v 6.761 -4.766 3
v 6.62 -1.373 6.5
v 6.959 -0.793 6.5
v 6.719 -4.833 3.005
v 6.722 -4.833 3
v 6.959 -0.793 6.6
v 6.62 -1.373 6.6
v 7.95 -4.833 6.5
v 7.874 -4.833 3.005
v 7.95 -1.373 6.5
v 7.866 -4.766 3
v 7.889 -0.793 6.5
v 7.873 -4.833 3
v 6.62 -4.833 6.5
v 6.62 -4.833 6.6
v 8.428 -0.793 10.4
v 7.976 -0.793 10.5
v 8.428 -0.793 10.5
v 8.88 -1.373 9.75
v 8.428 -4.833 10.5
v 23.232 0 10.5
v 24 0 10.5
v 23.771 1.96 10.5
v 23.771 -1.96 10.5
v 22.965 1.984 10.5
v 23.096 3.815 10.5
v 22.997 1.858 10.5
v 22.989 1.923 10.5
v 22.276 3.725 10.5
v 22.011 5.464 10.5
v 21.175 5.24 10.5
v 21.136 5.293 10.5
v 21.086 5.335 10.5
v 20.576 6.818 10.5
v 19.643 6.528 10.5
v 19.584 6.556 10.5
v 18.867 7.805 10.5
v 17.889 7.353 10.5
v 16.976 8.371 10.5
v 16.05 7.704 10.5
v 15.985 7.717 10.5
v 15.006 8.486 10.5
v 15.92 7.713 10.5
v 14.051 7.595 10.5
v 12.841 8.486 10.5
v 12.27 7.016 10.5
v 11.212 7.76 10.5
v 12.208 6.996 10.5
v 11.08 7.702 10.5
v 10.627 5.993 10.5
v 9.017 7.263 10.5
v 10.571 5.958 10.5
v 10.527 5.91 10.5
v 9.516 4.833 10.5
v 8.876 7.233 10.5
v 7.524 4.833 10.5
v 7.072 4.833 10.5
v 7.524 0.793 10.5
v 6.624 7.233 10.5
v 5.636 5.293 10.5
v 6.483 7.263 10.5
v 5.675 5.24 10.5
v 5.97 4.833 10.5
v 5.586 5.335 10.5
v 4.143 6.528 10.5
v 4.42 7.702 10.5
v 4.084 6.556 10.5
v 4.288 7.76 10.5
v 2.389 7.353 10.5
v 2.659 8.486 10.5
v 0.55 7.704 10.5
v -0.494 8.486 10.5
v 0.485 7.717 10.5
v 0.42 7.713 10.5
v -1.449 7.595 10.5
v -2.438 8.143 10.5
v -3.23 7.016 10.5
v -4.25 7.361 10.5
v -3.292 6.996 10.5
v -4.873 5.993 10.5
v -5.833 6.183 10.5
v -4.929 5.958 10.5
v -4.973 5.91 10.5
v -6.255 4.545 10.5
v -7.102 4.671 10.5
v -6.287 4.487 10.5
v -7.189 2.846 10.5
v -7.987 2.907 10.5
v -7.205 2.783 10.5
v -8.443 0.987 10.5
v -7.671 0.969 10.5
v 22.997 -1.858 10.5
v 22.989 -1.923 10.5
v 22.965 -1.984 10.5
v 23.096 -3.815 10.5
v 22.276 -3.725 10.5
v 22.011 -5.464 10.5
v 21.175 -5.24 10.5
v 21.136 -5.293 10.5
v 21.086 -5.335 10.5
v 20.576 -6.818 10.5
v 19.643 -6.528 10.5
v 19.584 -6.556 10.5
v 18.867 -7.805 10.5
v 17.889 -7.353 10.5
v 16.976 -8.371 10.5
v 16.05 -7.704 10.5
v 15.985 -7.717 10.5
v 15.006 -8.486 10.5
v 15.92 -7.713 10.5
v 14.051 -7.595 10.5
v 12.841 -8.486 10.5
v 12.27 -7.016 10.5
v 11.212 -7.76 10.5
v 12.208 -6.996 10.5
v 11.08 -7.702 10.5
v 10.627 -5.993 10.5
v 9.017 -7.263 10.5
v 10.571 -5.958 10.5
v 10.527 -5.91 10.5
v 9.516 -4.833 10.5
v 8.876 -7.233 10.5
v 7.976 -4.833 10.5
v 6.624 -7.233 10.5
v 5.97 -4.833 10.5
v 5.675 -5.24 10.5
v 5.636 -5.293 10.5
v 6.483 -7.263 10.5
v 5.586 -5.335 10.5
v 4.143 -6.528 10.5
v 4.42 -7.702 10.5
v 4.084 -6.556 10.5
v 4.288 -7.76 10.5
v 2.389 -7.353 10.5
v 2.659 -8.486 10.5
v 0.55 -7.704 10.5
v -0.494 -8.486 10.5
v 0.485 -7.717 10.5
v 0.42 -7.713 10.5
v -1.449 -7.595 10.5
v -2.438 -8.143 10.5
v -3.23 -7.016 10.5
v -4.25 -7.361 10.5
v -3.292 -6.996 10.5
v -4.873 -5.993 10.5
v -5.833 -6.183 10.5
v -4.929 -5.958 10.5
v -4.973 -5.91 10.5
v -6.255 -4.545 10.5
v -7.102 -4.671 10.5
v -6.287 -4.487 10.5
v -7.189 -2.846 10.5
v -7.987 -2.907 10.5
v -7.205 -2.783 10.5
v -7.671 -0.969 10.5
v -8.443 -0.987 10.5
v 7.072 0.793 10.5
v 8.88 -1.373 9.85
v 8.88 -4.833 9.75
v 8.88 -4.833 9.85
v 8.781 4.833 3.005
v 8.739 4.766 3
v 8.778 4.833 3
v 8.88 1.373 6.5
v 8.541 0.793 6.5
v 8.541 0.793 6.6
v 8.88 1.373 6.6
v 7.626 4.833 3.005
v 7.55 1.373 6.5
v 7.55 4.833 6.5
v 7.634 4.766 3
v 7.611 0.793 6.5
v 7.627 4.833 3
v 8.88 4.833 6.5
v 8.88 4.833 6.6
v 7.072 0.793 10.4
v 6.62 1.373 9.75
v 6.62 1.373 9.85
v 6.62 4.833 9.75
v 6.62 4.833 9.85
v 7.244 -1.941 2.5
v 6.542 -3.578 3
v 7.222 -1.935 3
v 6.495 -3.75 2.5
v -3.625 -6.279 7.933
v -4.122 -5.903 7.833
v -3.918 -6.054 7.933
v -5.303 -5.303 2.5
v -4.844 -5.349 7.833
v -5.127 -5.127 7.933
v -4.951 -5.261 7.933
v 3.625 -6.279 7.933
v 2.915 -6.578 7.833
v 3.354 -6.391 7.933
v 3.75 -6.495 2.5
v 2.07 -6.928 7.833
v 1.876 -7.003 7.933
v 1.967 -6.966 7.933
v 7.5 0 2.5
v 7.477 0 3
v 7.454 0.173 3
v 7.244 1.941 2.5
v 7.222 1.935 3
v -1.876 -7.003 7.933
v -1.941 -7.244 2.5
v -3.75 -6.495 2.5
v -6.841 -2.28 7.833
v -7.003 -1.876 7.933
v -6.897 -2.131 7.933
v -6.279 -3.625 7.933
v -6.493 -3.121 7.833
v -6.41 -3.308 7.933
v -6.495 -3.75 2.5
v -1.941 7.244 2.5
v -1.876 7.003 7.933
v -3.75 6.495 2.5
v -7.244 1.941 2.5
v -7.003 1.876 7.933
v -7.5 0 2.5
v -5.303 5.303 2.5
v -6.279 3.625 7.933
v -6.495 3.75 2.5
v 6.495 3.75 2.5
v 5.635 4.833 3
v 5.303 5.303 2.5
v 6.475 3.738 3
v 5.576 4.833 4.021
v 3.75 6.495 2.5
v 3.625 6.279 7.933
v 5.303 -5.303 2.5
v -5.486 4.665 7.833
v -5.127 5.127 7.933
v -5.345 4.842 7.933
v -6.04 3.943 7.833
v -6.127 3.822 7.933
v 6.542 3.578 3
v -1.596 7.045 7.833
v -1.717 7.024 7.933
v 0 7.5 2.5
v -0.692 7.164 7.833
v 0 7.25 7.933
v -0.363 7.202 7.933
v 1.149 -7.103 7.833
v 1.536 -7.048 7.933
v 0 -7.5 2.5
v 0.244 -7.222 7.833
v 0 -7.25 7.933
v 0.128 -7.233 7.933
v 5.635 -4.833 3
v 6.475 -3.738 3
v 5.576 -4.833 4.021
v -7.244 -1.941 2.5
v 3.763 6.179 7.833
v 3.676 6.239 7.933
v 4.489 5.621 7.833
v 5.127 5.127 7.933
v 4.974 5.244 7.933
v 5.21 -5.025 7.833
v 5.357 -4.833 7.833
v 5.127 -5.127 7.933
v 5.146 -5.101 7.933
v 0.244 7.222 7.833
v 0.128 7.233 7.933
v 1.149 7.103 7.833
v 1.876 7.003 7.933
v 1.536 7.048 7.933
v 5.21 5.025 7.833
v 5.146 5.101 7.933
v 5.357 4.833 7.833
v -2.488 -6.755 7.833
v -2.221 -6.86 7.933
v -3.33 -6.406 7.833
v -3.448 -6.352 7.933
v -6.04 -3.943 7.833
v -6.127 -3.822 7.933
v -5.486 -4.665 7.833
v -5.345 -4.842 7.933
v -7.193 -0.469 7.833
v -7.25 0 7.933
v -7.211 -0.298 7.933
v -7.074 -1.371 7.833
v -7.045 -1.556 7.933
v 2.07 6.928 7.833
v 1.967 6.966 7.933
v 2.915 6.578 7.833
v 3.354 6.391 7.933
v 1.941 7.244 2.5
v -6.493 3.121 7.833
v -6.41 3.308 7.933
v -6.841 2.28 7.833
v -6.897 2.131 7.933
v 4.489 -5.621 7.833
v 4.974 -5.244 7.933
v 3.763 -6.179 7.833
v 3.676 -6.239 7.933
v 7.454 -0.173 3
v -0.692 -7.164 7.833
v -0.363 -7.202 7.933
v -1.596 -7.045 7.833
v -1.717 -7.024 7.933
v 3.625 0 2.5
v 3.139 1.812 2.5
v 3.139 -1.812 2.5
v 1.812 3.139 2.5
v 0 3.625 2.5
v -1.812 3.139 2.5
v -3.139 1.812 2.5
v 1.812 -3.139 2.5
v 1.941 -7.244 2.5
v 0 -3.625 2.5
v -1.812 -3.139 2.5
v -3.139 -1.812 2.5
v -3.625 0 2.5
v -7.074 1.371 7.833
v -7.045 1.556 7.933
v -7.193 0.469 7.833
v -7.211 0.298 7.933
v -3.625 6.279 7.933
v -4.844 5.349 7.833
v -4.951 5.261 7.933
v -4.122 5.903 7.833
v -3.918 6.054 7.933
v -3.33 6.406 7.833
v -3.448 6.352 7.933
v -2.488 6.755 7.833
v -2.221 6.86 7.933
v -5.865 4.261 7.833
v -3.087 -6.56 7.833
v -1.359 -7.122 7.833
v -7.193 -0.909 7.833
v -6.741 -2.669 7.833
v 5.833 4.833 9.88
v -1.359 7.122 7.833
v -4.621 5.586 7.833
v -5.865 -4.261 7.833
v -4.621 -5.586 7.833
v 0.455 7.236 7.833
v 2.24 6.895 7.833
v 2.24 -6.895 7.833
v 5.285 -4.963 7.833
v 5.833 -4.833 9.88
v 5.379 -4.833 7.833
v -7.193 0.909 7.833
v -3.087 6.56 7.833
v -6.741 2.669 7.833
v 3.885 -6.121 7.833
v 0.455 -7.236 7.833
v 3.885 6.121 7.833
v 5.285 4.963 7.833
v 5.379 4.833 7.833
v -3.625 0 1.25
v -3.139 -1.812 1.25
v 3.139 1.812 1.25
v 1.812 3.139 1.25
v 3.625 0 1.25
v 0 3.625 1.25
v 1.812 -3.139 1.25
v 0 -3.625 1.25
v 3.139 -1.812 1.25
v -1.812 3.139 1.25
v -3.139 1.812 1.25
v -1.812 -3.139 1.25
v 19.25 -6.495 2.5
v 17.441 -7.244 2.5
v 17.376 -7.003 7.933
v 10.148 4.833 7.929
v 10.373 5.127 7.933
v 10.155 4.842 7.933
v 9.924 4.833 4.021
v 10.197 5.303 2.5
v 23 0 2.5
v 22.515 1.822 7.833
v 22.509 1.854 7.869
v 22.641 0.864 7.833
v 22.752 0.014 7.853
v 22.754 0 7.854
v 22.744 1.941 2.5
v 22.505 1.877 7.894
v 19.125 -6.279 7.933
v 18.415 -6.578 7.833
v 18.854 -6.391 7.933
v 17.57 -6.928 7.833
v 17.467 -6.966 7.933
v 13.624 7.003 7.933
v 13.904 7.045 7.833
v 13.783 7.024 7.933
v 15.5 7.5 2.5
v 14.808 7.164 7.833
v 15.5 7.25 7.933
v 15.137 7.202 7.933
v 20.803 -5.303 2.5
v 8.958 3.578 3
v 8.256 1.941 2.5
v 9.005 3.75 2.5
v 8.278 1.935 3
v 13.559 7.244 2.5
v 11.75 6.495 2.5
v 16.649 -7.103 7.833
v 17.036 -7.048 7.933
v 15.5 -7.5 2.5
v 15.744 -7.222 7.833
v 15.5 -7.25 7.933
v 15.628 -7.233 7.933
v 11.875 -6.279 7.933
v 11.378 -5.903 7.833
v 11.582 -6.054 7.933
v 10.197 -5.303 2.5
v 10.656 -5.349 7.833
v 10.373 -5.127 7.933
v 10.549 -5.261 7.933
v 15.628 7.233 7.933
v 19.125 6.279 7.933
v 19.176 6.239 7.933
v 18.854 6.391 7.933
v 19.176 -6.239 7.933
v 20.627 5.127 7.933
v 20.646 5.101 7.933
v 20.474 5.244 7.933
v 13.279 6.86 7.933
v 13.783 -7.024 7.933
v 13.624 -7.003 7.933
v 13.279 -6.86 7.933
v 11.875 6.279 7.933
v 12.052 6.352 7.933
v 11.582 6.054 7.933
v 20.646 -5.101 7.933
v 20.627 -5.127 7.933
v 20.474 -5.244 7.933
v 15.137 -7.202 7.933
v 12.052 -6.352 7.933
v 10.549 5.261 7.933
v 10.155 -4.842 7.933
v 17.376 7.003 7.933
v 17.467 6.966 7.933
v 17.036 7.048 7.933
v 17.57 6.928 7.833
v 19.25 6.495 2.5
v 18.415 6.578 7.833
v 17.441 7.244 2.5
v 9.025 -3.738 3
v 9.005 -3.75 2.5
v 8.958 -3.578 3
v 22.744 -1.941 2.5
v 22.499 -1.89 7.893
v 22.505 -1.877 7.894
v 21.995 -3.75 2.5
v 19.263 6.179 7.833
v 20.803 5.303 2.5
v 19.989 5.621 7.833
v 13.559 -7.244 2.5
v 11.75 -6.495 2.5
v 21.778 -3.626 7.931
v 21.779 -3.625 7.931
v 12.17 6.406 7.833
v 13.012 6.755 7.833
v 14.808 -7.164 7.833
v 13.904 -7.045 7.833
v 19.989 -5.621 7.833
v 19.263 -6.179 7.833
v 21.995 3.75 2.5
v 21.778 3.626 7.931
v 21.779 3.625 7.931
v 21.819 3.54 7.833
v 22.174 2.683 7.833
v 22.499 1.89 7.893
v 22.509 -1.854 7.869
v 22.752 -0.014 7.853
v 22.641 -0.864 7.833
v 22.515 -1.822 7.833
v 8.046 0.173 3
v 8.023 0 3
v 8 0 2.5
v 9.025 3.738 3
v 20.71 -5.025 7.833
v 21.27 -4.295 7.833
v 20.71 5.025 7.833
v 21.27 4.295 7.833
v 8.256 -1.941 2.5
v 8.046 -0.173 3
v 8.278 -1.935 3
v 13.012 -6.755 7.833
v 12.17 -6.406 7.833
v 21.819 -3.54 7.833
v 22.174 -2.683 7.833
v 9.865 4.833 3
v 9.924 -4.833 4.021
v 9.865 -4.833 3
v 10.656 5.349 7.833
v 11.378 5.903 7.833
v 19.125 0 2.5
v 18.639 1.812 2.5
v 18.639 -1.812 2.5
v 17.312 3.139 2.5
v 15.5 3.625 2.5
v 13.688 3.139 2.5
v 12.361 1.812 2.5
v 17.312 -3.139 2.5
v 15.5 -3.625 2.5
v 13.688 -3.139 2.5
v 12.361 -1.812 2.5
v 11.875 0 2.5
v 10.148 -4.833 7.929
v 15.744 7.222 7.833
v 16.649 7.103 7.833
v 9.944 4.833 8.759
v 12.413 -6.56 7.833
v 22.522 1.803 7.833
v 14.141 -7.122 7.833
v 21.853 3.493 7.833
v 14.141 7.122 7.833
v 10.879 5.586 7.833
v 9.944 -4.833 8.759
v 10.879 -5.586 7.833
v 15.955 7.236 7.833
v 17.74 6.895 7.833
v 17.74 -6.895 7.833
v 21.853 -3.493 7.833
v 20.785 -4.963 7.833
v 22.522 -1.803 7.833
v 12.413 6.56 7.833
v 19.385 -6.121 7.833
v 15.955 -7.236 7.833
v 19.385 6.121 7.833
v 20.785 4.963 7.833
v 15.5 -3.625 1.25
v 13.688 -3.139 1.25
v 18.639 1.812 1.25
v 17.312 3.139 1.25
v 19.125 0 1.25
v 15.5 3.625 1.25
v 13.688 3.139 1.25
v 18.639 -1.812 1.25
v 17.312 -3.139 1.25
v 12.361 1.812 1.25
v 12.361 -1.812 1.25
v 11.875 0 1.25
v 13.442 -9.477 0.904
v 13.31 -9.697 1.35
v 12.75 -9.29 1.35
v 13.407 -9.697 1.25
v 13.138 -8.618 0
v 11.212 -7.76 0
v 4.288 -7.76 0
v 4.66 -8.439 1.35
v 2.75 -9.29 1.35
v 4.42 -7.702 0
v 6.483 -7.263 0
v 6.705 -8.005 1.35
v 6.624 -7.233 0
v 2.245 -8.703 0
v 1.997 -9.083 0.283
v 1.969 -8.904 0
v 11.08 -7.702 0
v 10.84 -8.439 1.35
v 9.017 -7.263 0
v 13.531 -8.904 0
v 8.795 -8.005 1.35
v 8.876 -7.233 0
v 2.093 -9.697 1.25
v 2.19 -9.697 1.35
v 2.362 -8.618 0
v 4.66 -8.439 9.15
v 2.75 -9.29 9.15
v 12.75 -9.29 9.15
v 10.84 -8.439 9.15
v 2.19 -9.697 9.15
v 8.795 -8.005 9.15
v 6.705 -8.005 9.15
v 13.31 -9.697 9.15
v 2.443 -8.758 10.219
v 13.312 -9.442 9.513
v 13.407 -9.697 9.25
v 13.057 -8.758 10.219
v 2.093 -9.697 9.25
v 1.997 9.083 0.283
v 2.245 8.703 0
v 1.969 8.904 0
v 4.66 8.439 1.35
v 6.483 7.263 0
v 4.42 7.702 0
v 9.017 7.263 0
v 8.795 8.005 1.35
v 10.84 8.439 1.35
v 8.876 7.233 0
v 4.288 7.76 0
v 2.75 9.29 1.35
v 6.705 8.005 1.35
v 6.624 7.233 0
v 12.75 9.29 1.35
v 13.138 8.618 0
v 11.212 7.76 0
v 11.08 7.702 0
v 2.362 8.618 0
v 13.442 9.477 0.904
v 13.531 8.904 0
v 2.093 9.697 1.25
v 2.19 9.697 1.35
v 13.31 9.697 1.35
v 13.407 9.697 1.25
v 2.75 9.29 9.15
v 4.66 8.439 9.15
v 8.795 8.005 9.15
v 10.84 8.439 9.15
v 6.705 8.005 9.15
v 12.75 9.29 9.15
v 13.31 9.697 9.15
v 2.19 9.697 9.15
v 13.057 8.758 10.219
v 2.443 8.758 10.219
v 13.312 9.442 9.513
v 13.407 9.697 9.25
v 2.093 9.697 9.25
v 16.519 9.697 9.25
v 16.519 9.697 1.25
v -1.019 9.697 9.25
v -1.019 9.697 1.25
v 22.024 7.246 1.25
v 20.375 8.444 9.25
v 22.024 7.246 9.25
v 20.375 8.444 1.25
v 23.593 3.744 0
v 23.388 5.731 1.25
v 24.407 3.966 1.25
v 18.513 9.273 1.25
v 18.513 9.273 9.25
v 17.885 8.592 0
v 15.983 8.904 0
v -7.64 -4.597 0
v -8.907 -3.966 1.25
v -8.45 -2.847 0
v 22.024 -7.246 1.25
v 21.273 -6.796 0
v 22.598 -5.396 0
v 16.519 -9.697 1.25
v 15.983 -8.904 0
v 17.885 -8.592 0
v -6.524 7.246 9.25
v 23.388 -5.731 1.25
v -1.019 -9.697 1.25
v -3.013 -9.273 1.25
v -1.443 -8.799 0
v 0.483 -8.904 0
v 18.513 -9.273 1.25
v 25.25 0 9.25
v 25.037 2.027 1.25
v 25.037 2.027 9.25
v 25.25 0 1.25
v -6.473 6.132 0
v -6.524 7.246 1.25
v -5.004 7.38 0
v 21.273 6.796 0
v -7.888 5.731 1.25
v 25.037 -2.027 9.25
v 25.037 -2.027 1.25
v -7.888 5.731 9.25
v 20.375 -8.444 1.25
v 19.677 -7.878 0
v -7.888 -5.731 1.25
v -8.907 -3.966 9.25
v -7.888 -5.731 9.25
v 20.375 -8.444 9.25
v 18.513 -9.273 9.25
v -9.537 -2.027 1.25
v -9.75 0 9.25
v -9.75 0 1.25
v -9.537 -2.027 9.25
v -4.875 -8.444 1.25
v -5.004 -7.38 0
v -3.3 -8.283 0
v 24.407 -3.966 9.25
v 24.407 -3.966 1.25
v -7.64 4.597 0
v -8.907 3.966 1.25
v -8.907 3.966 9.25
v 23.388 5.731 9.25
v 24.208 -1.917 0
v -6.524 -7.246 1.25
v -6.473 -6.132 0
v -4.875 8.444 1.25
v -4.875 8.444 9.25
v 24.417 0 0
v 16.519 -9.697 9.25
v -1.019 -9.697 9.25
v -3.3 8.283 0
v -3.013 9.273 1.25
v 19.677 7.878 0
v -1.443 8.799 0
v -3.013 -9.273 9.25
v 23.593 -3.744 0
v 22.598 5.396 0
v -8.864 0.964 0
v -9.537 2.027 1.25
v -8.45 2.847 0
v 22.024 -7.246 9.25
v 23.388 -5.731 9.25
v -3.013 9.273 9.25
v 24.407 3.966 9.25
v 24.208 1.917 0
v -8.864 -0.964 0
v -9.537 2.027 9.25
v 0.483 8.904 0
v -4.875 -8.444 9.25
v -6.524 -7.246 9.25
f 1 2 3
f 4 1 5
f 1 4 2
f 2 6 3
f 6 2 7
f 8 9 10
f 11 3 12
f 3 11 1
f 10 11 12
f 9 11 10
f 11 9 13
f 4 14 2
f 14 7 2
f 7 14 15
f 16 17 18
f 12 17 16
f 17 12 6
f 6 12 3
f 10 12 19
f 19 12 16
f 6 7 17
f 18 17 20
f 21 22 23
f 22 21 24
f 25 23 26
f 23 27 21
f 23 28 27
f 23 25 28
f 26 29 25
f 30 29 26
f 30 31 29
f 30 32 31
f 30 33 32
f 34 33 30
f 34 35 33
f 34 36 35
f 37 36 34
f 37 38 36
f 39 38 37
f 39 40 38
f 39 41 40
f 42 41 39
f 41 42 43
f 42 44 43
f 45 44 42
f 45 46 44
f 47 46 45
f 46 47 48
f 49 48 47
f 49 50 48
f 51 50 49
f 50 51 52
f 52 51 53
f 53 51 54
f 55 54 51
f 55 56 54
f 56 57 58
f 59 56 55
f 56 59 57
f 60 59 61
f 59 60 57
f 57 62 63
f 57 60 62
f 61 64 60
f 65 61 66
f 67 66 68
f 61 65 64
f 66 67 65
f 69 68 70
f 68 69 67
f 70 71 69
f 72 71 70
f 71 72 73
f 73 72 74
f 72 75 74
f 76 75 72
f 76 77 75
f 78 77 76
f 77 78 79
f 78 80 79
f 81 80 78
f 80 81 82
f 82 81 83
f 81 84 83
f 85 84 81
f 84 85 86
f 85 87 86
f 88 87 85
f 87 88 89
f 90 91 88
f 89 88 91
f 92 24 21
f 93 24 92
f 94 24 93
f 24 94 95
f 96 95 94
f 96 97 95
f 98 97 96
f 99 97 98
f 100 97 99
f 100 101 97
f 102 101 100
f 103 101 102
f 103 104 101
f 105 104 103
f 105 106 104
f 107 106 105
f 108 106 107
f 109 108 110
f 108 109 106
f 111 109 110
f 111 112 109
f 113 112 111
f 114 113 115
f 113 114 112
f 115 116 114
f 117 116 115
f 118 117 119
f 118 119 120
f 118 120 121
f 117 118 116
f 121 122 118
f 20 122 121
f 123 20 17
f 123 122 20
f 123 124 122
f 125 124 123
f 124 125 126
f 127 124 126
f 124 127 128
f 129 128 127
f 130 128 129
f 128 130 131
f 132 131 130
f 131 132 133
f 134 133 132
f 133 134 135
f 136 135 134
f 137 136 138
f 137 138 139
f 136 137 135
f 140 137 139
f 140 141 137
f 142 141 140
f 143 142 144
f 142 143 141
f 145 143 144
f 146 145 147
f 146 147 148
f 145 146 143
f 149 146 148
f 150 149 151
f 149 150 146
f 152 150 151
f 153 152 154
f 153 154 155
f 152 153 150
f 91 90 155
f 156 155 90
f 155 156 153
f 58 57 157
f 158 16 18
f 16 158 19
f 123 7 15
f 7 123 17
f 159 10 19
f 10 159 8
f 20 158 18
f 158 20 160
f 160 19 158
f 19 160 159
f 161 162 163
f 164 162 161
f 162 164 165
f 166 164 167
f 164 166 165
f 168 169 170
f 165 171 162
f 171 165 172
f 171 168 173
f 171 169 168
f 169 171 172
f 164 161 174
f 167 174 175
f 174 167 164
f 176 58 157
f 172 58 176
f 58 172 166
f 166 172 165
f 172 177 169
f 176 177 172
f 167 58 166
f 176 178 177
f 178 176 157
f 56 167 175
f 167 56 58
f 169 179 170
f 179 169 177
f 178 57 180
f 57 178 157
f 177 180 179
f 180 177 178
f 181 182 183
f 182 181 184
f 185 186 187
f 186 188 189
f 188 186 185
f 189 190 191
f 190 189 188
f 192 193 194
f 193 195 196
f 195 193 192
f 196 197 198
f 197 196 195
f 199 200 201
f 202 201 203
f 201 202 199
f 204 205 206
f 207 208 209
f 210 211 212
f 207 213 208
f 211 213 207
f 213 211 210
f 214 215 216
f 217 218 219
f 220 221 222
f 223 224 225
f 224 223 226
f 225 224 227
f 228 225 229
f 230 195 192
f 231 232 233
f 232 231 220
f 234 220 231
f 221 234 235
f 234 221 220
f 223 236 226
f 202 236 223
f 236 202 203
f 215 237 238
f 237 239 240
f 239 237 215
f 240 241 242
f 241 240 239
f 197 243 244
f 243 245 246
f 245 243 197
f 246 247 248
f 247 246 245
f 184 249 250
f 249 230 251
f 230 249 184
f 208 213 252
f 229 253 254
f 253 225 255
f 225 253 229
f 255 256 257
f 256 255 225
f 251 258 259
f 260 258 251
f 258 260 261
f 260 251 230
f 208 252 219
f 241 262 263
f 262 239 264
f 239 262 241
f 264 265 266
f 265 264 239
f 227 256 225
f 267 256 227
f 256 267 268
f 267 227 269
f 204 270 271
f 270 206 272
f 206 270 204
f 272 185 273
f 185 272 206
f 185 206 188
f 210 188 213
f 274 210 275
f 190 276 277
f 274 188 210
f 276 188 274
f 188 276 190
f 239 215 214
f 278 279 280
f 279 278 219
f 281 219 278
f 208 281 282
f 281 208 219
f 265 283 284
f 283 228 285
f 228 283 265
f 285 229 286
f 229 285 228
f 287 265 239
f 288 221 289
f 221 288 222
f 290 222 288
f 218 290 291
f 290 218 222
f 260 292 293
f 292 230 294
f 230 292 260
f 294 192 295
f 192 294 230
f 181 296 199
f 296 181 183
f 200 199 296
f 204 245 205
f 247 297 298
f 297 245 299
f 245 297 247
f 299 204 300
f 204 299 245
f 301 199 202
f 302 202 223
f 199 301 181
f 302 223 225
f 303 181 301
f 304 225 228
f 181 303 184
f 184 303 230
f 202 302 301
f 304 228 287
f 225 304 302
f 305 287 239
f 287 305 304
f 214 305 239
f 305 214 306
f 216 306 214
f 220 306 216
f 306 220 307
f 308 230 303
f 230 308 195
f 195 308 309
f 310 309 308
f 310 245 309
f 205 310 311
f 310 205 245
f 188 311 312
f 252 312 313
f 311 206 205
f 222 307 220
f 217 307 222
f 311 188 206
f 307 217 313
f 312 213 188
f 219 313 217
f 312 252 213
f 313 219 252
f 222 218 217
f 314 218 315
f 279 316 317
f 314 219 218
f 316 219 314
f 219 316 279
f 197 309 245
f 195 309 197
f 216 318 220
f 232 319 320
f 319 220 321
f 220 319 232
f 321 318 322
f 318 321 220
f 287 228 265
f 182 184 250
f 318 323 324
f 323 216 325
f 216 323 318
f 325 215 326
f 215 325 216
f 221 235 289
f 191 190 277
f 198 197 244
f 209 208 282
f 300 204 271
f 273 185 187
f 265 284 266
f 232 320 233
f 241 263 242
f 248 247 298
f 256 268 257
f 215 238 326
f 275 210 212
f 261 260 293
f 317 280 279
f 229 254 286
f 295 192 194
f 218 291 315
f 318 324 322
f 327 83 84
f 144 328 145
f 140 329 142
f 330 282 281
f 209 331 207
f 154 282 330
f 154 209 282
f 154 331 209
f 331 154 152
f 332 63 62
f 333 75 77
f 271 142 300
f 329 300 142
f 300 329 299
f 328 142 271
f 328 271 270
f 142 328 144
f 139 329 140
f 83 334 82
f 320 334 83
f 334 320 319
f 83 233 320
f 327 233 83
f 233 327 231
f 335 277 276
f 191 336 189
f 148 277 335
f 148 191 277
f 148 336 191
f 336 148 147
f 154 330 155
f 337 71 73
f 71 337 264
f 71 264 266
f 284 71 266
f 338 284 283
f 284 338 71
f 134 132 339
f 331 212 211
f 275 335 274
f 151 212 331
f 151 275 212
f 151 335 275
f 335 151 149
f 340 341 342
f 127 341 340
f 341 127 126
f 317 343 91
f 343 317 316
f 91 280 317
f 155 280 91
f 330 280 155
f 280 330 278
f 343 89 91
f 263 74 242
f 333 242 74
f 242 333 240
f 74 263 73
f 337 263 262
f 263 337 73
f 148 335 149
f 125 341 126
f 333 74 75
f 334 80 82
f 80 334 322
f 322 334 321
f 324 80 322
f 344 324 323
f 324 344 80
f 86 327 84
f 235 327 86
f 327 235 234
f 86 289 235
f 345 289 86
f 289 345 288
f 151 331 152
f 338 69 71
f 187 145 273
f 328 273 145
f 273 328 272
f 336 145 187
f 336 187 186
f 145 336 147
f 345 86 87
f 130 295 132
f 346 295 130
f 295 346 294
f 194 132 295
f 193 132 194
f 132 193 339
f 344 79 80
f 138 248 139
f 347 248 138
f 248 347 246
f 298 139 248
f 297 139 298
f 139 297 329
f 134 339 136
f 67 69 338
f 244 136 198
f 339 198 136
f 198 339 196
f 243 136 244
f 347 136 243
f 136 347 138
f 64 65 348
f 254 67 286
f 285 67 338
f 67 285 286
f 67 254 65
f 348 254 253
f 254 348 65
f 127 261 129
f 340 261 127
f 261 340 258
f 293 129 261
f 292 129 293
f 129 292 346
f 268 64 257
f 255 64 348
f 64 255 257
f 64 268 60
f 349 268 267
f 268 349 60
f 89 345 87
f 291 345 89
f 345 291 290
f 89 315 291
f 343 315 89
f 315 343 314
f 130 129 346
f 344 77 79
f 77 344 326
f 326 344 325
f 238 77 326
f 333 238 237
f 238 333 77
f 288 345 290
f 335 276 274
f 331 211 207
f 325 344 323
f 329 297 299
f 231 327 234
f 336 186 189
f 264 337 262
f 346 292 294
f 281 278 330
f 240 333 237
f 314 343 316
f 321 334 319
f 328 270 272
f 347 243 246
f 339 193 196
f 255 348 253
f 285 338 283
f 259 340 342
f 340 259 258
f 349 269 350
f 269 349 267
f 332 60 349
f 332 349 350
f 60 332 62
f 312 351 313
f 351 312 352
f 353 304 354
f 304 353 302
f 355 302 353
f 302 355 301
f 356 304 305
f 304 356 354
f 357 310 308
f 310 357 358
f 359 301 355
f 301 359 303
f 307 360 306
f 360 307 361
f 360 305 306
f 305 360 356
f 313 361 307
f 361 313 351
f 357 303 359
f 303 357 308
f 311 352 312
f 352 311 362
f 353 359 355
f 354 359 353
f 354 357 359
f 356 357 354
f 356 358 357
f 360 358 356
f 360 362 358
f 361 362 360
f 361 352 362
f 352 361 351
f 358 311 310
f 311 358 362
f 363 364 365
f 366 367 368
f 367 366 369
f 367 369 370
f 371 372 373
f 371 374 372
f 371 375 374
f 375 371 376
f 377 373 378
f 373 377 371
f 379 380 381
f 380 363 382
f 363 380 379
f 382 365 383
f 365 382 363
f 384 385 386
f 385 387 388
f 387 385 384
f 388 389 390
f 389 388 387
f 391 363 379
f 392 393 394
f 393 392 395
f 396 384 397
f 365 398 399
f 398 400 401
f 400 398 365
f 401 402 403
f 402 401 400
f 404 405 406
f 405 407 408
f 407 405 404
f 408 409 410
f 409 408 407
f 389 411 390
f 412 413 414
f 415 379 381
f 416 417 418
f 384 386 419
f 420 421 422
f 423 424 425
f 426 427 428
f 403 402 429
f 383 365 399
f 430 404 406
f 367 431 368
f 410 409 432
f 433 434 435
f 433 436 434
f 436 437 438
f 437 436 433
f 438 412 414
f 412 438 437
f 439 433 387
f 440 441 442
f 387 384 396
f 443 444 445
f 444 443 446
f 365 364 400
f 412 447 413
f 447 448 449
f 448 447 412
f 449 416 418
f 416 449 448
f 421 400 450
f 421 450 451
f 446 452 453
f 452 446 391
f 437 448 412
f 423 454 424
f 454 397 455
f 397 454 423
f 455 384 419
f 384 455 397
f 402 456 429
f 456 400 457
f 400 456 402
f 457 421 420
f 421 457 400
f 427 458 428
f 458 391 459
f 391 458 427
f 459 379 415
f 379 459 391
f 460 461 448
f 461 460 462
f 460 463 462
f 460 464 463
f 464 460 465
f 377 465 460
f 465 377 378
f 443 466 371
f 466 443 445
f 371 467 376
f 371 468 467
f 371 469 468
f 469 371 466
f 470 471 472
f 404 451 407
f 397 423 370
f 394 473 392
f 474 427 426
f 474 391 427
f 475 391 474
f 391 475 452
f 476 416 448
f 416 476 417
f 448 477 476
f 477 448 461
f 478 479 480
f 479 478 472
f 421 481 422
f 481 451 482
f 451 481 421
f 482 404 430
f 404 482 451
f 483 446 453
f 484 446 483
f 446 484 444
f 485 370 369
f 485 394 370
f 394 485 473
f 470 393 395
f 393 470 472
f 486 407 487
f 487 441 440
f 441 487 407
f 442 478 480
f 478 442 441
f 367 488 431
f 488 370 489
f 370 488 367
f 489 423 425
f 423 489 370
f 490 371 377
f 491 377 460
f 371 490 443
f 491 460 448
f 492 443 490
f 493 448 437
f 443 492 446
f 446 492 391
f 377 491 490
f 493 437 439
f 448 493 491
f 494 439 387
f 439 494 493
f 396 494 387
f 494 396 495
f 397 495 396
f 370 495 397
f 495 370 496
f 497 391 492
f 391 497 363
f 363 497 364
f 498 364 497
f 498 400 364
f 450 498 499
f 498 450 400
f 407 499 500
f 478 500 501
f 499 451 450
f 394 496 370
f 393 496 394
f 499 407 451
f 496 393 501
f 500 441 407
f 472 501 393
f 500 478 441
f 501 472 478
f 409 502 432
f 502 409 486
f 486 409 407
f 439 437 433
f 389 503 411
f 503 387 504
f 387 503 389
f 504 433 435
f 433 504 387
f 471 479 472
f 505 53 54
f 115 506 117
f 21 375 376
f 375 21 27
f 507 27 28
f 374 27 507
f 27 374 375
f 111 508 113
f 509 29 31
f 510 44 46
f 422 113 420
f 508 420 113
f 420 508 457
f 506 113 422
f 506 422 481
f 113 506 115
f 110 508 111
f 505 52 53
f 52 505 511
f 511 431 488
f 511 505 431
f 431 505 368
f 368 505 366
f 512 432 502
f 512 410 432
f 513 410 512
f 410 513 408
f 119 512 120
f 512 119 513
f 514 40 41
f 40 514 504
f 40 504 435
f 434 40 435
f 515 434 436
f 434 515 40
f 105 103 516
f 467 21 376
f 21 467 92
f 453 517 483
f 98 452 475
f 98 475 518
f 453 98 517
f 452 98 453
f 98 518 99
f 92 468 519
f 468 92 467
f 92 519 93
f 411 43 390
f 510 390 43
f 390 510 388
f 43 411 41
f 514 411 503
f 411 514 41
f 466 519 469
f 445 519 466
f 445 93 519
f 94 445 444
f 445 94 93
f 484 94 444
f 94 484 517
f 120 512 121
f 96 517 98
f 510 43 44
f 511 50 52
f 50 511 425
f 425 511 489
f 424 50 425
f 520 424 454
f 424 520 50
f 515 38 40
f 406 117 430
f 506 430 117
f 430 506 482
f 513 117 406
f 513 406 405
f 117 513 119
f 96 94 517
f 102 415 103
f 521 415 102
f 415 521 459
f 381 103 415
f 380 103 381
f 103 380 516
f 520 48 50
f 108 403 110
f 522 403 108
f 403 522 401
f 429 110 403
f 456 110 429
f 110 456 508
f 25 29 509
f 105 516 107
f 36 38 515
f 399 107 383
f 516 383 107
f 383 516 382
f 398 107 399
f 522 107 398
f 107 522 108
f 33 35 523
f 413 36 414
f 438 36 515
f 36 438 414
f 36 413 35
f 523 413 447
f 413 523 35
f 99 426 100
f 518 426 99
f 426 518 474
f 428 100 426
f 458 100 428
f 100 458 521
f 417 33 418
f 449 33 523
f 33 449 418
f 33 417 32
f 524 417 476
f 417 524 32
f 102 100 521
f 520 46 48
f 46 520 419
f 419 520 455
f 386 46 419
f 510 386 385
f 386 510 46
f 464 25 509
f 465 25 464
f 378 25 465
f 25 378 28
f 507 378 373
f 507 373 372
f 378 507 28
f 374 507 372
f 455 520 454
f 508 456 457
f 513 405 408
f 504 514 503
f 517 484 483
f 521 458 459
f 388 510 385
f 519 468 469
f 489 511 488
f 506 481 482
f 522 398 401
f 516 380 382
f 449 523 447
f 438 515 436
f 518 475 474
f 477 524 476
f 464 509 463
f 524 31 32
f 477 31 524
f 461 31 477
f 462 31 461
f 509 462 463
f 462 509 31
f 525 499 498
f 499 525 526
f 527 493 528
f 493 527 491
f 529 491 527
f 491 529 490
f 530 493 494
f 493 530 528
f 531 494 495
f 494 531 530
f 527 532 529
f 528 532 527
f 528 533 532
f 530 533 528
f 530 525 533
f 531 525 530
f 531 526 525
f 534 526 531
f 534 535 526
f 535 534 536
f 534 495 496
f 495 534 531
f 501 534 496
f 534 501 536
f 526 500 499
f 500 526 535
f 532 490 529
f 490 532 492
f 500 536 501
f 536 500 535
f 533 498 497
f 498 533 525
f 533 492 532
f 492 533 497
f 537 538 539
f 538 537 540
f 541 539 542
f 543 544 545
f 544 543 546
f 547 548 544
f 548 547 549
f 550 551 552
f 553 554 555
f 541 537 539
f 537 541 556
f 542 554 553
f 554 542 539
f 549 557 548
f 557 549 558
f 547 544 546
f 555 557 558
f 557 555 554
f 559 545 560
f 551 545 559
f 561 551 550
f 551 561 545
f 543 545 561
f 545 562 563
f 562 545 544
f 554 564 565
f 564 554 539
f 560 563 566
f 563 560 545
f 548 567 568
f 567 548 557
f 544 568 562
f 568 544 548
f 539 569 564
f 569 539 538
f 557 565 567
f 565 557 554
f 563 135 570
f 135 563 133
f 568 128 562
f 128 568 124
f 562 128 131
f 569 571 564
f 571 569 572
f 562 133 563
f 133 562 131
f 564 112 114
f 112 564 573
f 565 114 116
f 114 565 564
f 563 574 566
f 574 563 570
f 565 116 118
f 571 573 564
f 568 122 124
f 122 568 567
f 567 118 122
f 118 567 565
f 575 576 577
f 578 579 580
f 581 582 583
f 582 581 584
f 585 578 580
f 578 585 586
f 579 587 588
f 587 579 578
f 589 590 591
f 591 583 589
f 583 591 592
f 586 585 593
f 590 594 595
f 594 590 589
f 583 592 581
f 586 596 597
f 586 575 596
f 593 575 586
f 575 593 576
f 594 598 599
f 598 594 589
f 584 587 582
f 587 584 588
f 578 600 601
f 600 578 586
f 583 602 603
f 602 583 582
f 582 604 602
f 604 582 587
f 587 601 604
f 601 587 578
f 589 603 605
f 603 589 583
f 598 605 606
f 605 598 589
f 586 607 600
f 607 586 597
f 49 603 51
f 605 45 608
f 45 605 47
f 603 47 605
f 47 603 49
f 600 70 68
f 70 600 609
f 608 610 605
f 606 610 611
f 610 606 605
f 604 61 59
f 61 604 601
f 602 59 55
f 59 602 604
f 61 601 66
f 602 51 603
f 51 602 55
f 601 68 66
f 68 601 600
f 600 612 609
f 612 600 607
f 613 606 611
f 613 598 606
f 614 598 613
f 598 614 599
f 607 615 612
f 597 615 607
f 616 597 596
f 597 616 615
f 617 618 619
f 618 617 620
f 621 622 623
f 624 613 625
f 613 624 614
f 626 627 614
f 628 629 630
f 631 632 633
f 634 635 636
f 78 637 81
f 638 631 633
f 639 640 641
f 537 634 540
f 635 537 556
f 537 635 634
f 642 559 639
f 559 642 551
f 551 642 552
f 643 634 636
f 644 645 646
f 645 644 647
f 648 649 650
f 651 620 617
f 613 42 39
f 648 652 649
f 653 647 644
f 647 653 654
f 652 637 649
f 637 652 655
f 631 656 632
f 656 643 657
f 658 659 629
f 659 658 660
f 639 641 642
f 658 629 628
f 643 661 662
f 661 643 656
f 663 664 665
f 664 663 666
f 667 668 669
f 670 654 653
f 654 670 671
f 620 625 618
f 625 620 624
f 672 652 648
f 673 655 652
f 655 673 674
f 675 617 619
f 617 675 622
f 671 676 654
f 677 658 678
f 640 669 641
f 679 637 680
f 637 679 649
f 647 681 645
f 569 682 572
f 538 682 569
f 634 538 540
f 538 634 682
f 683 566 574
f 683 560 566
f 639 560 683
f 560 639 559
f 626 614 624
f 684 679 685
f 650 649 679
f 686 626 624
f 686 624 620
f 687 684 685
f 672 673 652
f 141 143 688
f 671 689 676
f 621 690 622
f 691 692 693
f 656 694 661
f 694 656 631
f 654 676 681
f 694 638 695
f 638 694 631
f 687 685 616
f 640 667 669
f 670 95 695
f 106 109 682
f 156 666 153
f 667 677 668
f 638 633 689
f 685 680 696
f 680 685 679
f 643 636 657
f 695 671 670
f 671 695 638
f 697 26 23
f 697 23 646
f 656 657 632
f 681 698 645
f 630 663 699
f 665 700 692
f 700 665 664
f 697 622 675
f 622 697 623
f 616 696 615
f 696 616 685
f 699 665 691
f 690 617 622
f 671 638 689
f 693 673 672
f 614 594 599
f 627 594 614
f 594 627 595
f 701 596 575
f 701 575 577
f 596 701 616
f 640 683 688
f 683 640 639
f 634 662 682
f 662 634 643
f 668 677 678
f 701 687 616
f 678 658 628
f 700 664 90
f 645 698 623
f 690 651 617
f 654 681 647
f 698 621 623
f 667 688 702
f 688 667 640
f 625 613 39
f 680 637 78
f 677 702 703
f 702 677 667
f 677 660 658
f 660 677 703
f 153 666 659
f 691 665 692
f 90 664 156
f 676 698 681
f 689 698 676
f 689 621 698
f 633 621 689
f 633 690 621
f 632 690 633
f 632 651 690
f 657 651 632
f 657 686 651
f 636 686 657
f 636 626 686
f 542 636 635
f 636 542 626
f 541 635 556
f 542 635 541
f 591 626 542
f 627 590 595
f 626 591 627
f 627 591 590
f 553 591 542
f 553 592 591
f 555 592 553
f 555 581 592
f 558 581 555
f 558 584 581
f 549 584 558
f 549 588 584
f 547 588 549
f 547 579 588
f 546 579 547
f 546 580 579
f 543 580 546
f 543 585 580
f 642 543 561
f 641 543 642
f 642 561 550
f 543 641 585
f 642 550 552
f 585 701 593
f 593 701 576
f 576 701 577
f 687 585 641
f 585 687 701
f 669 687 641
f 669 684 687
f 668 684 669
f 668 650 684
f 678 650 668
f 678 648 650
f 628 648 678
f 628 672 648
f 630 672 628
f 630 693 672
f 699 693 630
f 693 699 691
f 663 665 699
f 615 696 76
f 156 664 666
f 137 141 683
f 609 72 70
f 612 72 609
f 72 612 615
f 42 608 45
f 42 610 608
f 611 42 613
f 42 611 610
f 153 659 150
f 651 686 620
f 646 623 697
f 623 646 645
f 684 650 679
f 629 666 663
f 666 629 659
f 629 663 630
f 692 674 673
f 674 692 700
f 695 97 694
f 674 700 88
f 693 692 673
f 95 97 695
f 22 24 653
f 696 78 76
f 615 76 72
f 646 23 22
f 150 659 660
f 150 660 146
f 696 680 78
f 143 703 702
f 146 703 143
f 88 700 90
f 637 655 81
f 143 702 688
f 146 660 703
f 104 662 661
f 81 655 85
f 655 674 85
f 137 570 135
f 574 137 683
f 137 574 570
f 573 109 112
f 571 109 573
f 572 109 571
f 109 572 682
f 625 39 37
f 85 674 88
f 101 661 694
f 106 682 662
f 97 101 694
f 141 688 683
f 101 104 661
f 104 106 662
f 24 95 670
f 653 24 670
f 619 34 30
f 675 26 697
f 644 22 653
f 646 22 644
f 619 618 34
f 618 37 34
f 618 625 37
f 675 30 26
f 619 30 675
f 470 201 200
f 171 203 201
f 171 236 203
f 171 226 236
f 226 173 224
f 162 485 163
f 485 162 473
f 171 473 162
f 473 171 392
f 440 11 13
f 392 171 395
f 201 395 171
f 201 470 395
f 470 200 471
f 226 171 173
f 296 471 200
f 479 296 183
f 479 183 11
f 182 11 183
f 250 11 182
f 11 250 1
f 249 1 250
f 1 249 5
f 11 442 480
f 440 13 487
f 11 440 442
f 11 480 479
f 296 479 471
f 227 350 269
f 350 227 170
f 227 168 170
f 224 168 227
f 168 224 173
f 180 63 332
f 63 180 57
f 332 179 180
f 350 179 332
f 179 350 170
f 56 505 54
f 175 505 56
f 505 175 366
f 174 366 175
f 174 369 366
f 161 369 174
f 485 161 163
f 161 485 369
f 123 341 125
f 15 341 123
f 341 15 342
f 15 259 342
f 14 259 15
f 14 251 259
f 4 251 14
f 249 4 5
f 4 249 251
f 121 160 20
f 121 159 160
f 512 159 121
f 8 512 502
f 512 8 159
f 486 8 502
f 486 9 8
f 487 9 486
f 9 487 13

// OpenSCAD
/////////////////////////////////////////////////////////////////////////
///
///  CellCaps - storage caps for single cell cylindrical batteries,
///             such as e.g. AA, AAA, C, D, 18650
///
/////////////////////////////////////////////////////////////////////////
///
///  2013-08-21 Heinz Spiess
///
///  released under Creative Commons - Attribution - Share Alike licence
/////////////////////////////////////////////////////////////////////////
/* Cells */
// Number of cells in the Y direction.
M = 1;  //[0,1,2,3,4] 
// Number of cells in the X direction. 
N = 2; // [0,1,2,3,4] 


/////////////////////////////////////////////////////////////////////////
// Space between instances
Space = 5;

// Parameters (w. values for AA cell)
//D = 14.5; // diameter
//H = 8;    // height
//W = 2.5;  // wall thickness
//S = 1;    // extra slack between cells
//F = 1.13; // width of friction winglets
//DI = 0.5; // diameter increment
//G = 20;   // radius of "grip" cavities
//GD = 1.8; // "grip" depth (0=no grip)


//N:  Number of cells in x-direction
//M:  Number of cells in y-direction
//PX:  Offset position in x-direction (no. of instances), usually 0
//PY:  Offset position in y-direction (no. of instances), usually 0










///  AA Cell
module AA_Caps(N=4, M=1, PX=0, PY=0){
    CellCaps(N, M, PX, PY, D=14.5, H=8, W=2.5, S=1, F=1.13, DI=0.5, G=20, GD=1.8);
}

///  AAA Cell
module AAA_Caps(N=4, M=1, PX=0, PY=0){
    CellCaps(N, M, PX, PY, D=10.5, H=7, W=2.3, S=1.2, F=1.13, DI=0.5, G=18, GD=1.1);
}

///  C Cell
module C_Caps(N=4, M=1, PX=0, PY=0){
    CellCaps(N, M, PX, PY, D=26.2, H=7, W=2.8, S=1.2, F=1.8, DI=0.5, G=36, GD=2.8);
}

///  D Cell
module D_Caps(N=4, M=1, PX=0, PY=0){
    CellCaps(N, M, PX, PY, D=34.2, H=7, W=2.8, S=1.2, F=1.8, DI=0.5, G=50, GD=3.5);
}

///  18650 LiIon/LiPo Cell
module 18650_Caps(N=4, M=1, PX=0, PY=0){
    CellCaps(N, M, PX, PY, D=18.5, H=9, W=2.8, S=1, F=1.5, DI=0.5, G=28, GD=2.2);
}


module CellCaps(N,M,PX,PY,D,H,W,S,F,DI,G,GD){

// position cell caps for multiple instances
translate([PX*(N*(D+S)+2*W+Space),PY*(M*(D+S)+2*W+Space),0]){

  // friction winglets
  for(m=[0:1:M])translate([0,(m-0.5)*(D+S),0])for(n=[0:1:N]){
    translate([(n-0.5)*(D+S),0,0])for(x=[-1,+1])for(y=[-1,+1])
    rotate(a=(1+x+2*y)*45){
       if(((n>0 && n<N) &&(m>0 && m<M))
         ||(n==0 && m>0 && m<M && x==-1 && y==-1)
         ||(n==N && m>0 && m<M && x==-1 && y==1)
         ||(m==0 && n>0 && n<N && x==1 && y==-1)
         ||(m==M && n>0 && n<N && x==1 && y==1)
           ){
       hull(){
         translate([-0.9*F,D/6-0.1,W])cube([F,0.1,H/2]);
         translate([-F,D/6-0.1,W+H/2])cube([F+0.2,0.28*D,0.1]);
         translate([-0.7*F,D/6-0.1,W+H/2])cube([F-0.2,0.32*D,0.1]);
       }
       hull(){
         translate([-0.7*F,D/6-0.1,W+H/2])cube([F-0.2,0.32*D,0.1]);
         translate([-F,D/6-0.1,W+H/2])cube([F+0.2,0.28*D,0.1]);
         translate([-0*F,D/6-0.1,W+H-0.75])cube([F,0.28*D,0.1]);
         translate([0.2*F,D/6-0.1,W+H-0.1])cube([0.4*F,0.32*D,0.1]);
       }
       }
    }
  }

  // main body
  difference(){
    // outer hull
    hull(){
      for(m=[0:1:M-1])for(n=[0:1:N-1]){
        // lower edge
        translate([n*(D+S),m*(D+S),0])cylinder(r=D/2+2*W/3,h=0.1);
	// main part
        translate([n*(D+S),m*(D+S),W/2])cylinder(r=D/2+W,h=H);
	// upper edge
        translate([n*(D+S),m*(D+S),W+H-0.1])cylinder(r=D/2+W/2,h=0.1);
      }
    }

    for(m=[0:1:M-1])for(n=[0:1:N-1]){
      // main cavity
      translate([n*(D+S),m*(D+S),W])cylinder(r1=D/2+DI/2,r2=D/2,h=2*H/3+0.1);
      translate([n*(D+S),m*(D+S),W+2*H/3])cylinder(r2=D/2+DI,r1=D/2,h=H/3+0.1);
      // cavity  for plus pole
      translate([n*(D+S),m*(D+S),W/2])cylinder(r=D/4,h=H+1);
    }

    // outer "grip" cavities in x-direction
    if(N>1)for(n=[0:1:N-2]){
      for(y=[-1,1]){
        translate([(n+0.5)*(D+S),y*(((y>0)?(M-1)*(D+S):0)+D/2+G/2+W-GD),-0.1])cylinder(r1=G/2+W/3,r2=G/2,h=W/2+0.2);
        translate([(n+0.5)*(D+S),y*(((y>0)?(M-1)*(D+S):0)+D/2+G/2+W-GD),W/2])cylinder(r=G/2,h=H+0.5*W);
        translate([(n+0.5)*(D+S),y*(((y>0)?(M-1)*(D+S):0)+D/2+G/2+W-GD),H+W/2-0.1])cylinder(r1=G/2,r2=G/2+W/3,h=W/2+0.2);
      }
    }

    // outer "grip" cavities in y-direction
    if(M>1)for(m=[0:1:M-2]){
      for(x=[-1,1]){
        translate([x*(((x>0)?(N-1)*(D+S):0)+D/2+G/2+W-GD),(m+0.5)*(D+S),-0.1])cylinder(r1=G/2+W/3,r2=G/2,h=W/2+0.2);
        translate([x*(((x>0)?(N-1)*(D+S):0)+D/2+G/2+W-GD),(m+0.5)*(D+S),W/2])cylinder(r=G/2,h=H+0.5*W);
        translate([x*(((x>0)?(N-1)*(D+S):0)+D/2+G/2+W-GD),(m+0.5)*(D+S),H+W/2-0.1])cylinder(r1=G/2,r2=G/2+W/3,h=W/2+0.2);
      }
    }

    // connect inner cavities in x-direction
    for(m=[0:1:M-1])translate([0,-D/3+m*(D+S),W+0.5])cube([(N-1)*(D+S),2*D/3,H+1]);

    // connect inner cavities in y-direction
    for(n=[0:1:N-1])translate([-D/3+n*(D+S),0,W+0.5])cube([2*D/3,(M-1)*(D+S),H+1]);
  }
  /*
  for(m=[0:1:M-1])translate([0,m*(D+S),0])for(n=[0:1:N-2]){
    translate([n*(D+S),0,0])for(A=[0,1])
    rotate(a=A*180){
       hull(){
         translate([-A*(D+S)+D/2-0.9*F,-D/3-0.1,W])cube([F,0.1,H/2]);
         translate([-A*(D+S)+D/2-0.9*F,-D/3-0.1,W+H/2])cube([F+0.2,0.25*D,0.1]);
       }
       hull(){
         translate([-A*(D+S)+D/2-0.9*F,-D/3-0.1,W+H/2])cube([F+0.2,0.25*D,0.1]);
         translate([-A*(D+S)+D/2-0*F,-D/3-0.1,W+H-0.1])cube([F,0.25*D,0.1]);
       }
    }
  }
  */
}
}

for(x=[0:1:0]) for(y=[0:1:0]) {
//AAA_Caps(N=2,M=1,PX=x,PY=y);
//AAA_Caps(N=3,M=1,PX=x,PY=y);
//AAA_Caps(N=4,M=1,PX=x,PY=y);
//AAA_Caps(N=2,M=2,PX=x,PY=y);
//AAA_Caps(N=4,M=6,PX=x,PY=y);

//AA_Caps(N=2,M=1,PX=x,PY=y);
//AA_Caps(N=3,M=1,PX=x,PY=y);
//AA_Caps(N=4,M=1,PX=x,PY=y);
AA_Caps(N,M,PX=x,PY=y);
//AA_Caps(N=6,M=4,PX=x,PY=y);

//C_Caps(N=2,M=1,PX=x,PY=y); // not yet tested!
//C_Caps(N=3,M=1,PX=x,PY=y); // not yet tested!
//C_Caps(N=4,M=1,PX=x,PY=y); // not yet tested!

//D_Caps(N=2,M=1,PX=x,PY=y); // not yet tested!
//D_Caps(N=3,M=1,PX=x,PY=y); // not yet tested!
//D_Caps(N=4,M=1,PX=x,PY=y); // not yet tested!

//18650_Caps(N=2,M=1,PX=x,PY=y);
//18650_Caps(N=3,M=1,PX=x,PY=y);
//18650_Caps(N=4,M=1,PX=x,PY=y);
//18650_Caps(N=2,M=2,PX=x,PY=y);
}
